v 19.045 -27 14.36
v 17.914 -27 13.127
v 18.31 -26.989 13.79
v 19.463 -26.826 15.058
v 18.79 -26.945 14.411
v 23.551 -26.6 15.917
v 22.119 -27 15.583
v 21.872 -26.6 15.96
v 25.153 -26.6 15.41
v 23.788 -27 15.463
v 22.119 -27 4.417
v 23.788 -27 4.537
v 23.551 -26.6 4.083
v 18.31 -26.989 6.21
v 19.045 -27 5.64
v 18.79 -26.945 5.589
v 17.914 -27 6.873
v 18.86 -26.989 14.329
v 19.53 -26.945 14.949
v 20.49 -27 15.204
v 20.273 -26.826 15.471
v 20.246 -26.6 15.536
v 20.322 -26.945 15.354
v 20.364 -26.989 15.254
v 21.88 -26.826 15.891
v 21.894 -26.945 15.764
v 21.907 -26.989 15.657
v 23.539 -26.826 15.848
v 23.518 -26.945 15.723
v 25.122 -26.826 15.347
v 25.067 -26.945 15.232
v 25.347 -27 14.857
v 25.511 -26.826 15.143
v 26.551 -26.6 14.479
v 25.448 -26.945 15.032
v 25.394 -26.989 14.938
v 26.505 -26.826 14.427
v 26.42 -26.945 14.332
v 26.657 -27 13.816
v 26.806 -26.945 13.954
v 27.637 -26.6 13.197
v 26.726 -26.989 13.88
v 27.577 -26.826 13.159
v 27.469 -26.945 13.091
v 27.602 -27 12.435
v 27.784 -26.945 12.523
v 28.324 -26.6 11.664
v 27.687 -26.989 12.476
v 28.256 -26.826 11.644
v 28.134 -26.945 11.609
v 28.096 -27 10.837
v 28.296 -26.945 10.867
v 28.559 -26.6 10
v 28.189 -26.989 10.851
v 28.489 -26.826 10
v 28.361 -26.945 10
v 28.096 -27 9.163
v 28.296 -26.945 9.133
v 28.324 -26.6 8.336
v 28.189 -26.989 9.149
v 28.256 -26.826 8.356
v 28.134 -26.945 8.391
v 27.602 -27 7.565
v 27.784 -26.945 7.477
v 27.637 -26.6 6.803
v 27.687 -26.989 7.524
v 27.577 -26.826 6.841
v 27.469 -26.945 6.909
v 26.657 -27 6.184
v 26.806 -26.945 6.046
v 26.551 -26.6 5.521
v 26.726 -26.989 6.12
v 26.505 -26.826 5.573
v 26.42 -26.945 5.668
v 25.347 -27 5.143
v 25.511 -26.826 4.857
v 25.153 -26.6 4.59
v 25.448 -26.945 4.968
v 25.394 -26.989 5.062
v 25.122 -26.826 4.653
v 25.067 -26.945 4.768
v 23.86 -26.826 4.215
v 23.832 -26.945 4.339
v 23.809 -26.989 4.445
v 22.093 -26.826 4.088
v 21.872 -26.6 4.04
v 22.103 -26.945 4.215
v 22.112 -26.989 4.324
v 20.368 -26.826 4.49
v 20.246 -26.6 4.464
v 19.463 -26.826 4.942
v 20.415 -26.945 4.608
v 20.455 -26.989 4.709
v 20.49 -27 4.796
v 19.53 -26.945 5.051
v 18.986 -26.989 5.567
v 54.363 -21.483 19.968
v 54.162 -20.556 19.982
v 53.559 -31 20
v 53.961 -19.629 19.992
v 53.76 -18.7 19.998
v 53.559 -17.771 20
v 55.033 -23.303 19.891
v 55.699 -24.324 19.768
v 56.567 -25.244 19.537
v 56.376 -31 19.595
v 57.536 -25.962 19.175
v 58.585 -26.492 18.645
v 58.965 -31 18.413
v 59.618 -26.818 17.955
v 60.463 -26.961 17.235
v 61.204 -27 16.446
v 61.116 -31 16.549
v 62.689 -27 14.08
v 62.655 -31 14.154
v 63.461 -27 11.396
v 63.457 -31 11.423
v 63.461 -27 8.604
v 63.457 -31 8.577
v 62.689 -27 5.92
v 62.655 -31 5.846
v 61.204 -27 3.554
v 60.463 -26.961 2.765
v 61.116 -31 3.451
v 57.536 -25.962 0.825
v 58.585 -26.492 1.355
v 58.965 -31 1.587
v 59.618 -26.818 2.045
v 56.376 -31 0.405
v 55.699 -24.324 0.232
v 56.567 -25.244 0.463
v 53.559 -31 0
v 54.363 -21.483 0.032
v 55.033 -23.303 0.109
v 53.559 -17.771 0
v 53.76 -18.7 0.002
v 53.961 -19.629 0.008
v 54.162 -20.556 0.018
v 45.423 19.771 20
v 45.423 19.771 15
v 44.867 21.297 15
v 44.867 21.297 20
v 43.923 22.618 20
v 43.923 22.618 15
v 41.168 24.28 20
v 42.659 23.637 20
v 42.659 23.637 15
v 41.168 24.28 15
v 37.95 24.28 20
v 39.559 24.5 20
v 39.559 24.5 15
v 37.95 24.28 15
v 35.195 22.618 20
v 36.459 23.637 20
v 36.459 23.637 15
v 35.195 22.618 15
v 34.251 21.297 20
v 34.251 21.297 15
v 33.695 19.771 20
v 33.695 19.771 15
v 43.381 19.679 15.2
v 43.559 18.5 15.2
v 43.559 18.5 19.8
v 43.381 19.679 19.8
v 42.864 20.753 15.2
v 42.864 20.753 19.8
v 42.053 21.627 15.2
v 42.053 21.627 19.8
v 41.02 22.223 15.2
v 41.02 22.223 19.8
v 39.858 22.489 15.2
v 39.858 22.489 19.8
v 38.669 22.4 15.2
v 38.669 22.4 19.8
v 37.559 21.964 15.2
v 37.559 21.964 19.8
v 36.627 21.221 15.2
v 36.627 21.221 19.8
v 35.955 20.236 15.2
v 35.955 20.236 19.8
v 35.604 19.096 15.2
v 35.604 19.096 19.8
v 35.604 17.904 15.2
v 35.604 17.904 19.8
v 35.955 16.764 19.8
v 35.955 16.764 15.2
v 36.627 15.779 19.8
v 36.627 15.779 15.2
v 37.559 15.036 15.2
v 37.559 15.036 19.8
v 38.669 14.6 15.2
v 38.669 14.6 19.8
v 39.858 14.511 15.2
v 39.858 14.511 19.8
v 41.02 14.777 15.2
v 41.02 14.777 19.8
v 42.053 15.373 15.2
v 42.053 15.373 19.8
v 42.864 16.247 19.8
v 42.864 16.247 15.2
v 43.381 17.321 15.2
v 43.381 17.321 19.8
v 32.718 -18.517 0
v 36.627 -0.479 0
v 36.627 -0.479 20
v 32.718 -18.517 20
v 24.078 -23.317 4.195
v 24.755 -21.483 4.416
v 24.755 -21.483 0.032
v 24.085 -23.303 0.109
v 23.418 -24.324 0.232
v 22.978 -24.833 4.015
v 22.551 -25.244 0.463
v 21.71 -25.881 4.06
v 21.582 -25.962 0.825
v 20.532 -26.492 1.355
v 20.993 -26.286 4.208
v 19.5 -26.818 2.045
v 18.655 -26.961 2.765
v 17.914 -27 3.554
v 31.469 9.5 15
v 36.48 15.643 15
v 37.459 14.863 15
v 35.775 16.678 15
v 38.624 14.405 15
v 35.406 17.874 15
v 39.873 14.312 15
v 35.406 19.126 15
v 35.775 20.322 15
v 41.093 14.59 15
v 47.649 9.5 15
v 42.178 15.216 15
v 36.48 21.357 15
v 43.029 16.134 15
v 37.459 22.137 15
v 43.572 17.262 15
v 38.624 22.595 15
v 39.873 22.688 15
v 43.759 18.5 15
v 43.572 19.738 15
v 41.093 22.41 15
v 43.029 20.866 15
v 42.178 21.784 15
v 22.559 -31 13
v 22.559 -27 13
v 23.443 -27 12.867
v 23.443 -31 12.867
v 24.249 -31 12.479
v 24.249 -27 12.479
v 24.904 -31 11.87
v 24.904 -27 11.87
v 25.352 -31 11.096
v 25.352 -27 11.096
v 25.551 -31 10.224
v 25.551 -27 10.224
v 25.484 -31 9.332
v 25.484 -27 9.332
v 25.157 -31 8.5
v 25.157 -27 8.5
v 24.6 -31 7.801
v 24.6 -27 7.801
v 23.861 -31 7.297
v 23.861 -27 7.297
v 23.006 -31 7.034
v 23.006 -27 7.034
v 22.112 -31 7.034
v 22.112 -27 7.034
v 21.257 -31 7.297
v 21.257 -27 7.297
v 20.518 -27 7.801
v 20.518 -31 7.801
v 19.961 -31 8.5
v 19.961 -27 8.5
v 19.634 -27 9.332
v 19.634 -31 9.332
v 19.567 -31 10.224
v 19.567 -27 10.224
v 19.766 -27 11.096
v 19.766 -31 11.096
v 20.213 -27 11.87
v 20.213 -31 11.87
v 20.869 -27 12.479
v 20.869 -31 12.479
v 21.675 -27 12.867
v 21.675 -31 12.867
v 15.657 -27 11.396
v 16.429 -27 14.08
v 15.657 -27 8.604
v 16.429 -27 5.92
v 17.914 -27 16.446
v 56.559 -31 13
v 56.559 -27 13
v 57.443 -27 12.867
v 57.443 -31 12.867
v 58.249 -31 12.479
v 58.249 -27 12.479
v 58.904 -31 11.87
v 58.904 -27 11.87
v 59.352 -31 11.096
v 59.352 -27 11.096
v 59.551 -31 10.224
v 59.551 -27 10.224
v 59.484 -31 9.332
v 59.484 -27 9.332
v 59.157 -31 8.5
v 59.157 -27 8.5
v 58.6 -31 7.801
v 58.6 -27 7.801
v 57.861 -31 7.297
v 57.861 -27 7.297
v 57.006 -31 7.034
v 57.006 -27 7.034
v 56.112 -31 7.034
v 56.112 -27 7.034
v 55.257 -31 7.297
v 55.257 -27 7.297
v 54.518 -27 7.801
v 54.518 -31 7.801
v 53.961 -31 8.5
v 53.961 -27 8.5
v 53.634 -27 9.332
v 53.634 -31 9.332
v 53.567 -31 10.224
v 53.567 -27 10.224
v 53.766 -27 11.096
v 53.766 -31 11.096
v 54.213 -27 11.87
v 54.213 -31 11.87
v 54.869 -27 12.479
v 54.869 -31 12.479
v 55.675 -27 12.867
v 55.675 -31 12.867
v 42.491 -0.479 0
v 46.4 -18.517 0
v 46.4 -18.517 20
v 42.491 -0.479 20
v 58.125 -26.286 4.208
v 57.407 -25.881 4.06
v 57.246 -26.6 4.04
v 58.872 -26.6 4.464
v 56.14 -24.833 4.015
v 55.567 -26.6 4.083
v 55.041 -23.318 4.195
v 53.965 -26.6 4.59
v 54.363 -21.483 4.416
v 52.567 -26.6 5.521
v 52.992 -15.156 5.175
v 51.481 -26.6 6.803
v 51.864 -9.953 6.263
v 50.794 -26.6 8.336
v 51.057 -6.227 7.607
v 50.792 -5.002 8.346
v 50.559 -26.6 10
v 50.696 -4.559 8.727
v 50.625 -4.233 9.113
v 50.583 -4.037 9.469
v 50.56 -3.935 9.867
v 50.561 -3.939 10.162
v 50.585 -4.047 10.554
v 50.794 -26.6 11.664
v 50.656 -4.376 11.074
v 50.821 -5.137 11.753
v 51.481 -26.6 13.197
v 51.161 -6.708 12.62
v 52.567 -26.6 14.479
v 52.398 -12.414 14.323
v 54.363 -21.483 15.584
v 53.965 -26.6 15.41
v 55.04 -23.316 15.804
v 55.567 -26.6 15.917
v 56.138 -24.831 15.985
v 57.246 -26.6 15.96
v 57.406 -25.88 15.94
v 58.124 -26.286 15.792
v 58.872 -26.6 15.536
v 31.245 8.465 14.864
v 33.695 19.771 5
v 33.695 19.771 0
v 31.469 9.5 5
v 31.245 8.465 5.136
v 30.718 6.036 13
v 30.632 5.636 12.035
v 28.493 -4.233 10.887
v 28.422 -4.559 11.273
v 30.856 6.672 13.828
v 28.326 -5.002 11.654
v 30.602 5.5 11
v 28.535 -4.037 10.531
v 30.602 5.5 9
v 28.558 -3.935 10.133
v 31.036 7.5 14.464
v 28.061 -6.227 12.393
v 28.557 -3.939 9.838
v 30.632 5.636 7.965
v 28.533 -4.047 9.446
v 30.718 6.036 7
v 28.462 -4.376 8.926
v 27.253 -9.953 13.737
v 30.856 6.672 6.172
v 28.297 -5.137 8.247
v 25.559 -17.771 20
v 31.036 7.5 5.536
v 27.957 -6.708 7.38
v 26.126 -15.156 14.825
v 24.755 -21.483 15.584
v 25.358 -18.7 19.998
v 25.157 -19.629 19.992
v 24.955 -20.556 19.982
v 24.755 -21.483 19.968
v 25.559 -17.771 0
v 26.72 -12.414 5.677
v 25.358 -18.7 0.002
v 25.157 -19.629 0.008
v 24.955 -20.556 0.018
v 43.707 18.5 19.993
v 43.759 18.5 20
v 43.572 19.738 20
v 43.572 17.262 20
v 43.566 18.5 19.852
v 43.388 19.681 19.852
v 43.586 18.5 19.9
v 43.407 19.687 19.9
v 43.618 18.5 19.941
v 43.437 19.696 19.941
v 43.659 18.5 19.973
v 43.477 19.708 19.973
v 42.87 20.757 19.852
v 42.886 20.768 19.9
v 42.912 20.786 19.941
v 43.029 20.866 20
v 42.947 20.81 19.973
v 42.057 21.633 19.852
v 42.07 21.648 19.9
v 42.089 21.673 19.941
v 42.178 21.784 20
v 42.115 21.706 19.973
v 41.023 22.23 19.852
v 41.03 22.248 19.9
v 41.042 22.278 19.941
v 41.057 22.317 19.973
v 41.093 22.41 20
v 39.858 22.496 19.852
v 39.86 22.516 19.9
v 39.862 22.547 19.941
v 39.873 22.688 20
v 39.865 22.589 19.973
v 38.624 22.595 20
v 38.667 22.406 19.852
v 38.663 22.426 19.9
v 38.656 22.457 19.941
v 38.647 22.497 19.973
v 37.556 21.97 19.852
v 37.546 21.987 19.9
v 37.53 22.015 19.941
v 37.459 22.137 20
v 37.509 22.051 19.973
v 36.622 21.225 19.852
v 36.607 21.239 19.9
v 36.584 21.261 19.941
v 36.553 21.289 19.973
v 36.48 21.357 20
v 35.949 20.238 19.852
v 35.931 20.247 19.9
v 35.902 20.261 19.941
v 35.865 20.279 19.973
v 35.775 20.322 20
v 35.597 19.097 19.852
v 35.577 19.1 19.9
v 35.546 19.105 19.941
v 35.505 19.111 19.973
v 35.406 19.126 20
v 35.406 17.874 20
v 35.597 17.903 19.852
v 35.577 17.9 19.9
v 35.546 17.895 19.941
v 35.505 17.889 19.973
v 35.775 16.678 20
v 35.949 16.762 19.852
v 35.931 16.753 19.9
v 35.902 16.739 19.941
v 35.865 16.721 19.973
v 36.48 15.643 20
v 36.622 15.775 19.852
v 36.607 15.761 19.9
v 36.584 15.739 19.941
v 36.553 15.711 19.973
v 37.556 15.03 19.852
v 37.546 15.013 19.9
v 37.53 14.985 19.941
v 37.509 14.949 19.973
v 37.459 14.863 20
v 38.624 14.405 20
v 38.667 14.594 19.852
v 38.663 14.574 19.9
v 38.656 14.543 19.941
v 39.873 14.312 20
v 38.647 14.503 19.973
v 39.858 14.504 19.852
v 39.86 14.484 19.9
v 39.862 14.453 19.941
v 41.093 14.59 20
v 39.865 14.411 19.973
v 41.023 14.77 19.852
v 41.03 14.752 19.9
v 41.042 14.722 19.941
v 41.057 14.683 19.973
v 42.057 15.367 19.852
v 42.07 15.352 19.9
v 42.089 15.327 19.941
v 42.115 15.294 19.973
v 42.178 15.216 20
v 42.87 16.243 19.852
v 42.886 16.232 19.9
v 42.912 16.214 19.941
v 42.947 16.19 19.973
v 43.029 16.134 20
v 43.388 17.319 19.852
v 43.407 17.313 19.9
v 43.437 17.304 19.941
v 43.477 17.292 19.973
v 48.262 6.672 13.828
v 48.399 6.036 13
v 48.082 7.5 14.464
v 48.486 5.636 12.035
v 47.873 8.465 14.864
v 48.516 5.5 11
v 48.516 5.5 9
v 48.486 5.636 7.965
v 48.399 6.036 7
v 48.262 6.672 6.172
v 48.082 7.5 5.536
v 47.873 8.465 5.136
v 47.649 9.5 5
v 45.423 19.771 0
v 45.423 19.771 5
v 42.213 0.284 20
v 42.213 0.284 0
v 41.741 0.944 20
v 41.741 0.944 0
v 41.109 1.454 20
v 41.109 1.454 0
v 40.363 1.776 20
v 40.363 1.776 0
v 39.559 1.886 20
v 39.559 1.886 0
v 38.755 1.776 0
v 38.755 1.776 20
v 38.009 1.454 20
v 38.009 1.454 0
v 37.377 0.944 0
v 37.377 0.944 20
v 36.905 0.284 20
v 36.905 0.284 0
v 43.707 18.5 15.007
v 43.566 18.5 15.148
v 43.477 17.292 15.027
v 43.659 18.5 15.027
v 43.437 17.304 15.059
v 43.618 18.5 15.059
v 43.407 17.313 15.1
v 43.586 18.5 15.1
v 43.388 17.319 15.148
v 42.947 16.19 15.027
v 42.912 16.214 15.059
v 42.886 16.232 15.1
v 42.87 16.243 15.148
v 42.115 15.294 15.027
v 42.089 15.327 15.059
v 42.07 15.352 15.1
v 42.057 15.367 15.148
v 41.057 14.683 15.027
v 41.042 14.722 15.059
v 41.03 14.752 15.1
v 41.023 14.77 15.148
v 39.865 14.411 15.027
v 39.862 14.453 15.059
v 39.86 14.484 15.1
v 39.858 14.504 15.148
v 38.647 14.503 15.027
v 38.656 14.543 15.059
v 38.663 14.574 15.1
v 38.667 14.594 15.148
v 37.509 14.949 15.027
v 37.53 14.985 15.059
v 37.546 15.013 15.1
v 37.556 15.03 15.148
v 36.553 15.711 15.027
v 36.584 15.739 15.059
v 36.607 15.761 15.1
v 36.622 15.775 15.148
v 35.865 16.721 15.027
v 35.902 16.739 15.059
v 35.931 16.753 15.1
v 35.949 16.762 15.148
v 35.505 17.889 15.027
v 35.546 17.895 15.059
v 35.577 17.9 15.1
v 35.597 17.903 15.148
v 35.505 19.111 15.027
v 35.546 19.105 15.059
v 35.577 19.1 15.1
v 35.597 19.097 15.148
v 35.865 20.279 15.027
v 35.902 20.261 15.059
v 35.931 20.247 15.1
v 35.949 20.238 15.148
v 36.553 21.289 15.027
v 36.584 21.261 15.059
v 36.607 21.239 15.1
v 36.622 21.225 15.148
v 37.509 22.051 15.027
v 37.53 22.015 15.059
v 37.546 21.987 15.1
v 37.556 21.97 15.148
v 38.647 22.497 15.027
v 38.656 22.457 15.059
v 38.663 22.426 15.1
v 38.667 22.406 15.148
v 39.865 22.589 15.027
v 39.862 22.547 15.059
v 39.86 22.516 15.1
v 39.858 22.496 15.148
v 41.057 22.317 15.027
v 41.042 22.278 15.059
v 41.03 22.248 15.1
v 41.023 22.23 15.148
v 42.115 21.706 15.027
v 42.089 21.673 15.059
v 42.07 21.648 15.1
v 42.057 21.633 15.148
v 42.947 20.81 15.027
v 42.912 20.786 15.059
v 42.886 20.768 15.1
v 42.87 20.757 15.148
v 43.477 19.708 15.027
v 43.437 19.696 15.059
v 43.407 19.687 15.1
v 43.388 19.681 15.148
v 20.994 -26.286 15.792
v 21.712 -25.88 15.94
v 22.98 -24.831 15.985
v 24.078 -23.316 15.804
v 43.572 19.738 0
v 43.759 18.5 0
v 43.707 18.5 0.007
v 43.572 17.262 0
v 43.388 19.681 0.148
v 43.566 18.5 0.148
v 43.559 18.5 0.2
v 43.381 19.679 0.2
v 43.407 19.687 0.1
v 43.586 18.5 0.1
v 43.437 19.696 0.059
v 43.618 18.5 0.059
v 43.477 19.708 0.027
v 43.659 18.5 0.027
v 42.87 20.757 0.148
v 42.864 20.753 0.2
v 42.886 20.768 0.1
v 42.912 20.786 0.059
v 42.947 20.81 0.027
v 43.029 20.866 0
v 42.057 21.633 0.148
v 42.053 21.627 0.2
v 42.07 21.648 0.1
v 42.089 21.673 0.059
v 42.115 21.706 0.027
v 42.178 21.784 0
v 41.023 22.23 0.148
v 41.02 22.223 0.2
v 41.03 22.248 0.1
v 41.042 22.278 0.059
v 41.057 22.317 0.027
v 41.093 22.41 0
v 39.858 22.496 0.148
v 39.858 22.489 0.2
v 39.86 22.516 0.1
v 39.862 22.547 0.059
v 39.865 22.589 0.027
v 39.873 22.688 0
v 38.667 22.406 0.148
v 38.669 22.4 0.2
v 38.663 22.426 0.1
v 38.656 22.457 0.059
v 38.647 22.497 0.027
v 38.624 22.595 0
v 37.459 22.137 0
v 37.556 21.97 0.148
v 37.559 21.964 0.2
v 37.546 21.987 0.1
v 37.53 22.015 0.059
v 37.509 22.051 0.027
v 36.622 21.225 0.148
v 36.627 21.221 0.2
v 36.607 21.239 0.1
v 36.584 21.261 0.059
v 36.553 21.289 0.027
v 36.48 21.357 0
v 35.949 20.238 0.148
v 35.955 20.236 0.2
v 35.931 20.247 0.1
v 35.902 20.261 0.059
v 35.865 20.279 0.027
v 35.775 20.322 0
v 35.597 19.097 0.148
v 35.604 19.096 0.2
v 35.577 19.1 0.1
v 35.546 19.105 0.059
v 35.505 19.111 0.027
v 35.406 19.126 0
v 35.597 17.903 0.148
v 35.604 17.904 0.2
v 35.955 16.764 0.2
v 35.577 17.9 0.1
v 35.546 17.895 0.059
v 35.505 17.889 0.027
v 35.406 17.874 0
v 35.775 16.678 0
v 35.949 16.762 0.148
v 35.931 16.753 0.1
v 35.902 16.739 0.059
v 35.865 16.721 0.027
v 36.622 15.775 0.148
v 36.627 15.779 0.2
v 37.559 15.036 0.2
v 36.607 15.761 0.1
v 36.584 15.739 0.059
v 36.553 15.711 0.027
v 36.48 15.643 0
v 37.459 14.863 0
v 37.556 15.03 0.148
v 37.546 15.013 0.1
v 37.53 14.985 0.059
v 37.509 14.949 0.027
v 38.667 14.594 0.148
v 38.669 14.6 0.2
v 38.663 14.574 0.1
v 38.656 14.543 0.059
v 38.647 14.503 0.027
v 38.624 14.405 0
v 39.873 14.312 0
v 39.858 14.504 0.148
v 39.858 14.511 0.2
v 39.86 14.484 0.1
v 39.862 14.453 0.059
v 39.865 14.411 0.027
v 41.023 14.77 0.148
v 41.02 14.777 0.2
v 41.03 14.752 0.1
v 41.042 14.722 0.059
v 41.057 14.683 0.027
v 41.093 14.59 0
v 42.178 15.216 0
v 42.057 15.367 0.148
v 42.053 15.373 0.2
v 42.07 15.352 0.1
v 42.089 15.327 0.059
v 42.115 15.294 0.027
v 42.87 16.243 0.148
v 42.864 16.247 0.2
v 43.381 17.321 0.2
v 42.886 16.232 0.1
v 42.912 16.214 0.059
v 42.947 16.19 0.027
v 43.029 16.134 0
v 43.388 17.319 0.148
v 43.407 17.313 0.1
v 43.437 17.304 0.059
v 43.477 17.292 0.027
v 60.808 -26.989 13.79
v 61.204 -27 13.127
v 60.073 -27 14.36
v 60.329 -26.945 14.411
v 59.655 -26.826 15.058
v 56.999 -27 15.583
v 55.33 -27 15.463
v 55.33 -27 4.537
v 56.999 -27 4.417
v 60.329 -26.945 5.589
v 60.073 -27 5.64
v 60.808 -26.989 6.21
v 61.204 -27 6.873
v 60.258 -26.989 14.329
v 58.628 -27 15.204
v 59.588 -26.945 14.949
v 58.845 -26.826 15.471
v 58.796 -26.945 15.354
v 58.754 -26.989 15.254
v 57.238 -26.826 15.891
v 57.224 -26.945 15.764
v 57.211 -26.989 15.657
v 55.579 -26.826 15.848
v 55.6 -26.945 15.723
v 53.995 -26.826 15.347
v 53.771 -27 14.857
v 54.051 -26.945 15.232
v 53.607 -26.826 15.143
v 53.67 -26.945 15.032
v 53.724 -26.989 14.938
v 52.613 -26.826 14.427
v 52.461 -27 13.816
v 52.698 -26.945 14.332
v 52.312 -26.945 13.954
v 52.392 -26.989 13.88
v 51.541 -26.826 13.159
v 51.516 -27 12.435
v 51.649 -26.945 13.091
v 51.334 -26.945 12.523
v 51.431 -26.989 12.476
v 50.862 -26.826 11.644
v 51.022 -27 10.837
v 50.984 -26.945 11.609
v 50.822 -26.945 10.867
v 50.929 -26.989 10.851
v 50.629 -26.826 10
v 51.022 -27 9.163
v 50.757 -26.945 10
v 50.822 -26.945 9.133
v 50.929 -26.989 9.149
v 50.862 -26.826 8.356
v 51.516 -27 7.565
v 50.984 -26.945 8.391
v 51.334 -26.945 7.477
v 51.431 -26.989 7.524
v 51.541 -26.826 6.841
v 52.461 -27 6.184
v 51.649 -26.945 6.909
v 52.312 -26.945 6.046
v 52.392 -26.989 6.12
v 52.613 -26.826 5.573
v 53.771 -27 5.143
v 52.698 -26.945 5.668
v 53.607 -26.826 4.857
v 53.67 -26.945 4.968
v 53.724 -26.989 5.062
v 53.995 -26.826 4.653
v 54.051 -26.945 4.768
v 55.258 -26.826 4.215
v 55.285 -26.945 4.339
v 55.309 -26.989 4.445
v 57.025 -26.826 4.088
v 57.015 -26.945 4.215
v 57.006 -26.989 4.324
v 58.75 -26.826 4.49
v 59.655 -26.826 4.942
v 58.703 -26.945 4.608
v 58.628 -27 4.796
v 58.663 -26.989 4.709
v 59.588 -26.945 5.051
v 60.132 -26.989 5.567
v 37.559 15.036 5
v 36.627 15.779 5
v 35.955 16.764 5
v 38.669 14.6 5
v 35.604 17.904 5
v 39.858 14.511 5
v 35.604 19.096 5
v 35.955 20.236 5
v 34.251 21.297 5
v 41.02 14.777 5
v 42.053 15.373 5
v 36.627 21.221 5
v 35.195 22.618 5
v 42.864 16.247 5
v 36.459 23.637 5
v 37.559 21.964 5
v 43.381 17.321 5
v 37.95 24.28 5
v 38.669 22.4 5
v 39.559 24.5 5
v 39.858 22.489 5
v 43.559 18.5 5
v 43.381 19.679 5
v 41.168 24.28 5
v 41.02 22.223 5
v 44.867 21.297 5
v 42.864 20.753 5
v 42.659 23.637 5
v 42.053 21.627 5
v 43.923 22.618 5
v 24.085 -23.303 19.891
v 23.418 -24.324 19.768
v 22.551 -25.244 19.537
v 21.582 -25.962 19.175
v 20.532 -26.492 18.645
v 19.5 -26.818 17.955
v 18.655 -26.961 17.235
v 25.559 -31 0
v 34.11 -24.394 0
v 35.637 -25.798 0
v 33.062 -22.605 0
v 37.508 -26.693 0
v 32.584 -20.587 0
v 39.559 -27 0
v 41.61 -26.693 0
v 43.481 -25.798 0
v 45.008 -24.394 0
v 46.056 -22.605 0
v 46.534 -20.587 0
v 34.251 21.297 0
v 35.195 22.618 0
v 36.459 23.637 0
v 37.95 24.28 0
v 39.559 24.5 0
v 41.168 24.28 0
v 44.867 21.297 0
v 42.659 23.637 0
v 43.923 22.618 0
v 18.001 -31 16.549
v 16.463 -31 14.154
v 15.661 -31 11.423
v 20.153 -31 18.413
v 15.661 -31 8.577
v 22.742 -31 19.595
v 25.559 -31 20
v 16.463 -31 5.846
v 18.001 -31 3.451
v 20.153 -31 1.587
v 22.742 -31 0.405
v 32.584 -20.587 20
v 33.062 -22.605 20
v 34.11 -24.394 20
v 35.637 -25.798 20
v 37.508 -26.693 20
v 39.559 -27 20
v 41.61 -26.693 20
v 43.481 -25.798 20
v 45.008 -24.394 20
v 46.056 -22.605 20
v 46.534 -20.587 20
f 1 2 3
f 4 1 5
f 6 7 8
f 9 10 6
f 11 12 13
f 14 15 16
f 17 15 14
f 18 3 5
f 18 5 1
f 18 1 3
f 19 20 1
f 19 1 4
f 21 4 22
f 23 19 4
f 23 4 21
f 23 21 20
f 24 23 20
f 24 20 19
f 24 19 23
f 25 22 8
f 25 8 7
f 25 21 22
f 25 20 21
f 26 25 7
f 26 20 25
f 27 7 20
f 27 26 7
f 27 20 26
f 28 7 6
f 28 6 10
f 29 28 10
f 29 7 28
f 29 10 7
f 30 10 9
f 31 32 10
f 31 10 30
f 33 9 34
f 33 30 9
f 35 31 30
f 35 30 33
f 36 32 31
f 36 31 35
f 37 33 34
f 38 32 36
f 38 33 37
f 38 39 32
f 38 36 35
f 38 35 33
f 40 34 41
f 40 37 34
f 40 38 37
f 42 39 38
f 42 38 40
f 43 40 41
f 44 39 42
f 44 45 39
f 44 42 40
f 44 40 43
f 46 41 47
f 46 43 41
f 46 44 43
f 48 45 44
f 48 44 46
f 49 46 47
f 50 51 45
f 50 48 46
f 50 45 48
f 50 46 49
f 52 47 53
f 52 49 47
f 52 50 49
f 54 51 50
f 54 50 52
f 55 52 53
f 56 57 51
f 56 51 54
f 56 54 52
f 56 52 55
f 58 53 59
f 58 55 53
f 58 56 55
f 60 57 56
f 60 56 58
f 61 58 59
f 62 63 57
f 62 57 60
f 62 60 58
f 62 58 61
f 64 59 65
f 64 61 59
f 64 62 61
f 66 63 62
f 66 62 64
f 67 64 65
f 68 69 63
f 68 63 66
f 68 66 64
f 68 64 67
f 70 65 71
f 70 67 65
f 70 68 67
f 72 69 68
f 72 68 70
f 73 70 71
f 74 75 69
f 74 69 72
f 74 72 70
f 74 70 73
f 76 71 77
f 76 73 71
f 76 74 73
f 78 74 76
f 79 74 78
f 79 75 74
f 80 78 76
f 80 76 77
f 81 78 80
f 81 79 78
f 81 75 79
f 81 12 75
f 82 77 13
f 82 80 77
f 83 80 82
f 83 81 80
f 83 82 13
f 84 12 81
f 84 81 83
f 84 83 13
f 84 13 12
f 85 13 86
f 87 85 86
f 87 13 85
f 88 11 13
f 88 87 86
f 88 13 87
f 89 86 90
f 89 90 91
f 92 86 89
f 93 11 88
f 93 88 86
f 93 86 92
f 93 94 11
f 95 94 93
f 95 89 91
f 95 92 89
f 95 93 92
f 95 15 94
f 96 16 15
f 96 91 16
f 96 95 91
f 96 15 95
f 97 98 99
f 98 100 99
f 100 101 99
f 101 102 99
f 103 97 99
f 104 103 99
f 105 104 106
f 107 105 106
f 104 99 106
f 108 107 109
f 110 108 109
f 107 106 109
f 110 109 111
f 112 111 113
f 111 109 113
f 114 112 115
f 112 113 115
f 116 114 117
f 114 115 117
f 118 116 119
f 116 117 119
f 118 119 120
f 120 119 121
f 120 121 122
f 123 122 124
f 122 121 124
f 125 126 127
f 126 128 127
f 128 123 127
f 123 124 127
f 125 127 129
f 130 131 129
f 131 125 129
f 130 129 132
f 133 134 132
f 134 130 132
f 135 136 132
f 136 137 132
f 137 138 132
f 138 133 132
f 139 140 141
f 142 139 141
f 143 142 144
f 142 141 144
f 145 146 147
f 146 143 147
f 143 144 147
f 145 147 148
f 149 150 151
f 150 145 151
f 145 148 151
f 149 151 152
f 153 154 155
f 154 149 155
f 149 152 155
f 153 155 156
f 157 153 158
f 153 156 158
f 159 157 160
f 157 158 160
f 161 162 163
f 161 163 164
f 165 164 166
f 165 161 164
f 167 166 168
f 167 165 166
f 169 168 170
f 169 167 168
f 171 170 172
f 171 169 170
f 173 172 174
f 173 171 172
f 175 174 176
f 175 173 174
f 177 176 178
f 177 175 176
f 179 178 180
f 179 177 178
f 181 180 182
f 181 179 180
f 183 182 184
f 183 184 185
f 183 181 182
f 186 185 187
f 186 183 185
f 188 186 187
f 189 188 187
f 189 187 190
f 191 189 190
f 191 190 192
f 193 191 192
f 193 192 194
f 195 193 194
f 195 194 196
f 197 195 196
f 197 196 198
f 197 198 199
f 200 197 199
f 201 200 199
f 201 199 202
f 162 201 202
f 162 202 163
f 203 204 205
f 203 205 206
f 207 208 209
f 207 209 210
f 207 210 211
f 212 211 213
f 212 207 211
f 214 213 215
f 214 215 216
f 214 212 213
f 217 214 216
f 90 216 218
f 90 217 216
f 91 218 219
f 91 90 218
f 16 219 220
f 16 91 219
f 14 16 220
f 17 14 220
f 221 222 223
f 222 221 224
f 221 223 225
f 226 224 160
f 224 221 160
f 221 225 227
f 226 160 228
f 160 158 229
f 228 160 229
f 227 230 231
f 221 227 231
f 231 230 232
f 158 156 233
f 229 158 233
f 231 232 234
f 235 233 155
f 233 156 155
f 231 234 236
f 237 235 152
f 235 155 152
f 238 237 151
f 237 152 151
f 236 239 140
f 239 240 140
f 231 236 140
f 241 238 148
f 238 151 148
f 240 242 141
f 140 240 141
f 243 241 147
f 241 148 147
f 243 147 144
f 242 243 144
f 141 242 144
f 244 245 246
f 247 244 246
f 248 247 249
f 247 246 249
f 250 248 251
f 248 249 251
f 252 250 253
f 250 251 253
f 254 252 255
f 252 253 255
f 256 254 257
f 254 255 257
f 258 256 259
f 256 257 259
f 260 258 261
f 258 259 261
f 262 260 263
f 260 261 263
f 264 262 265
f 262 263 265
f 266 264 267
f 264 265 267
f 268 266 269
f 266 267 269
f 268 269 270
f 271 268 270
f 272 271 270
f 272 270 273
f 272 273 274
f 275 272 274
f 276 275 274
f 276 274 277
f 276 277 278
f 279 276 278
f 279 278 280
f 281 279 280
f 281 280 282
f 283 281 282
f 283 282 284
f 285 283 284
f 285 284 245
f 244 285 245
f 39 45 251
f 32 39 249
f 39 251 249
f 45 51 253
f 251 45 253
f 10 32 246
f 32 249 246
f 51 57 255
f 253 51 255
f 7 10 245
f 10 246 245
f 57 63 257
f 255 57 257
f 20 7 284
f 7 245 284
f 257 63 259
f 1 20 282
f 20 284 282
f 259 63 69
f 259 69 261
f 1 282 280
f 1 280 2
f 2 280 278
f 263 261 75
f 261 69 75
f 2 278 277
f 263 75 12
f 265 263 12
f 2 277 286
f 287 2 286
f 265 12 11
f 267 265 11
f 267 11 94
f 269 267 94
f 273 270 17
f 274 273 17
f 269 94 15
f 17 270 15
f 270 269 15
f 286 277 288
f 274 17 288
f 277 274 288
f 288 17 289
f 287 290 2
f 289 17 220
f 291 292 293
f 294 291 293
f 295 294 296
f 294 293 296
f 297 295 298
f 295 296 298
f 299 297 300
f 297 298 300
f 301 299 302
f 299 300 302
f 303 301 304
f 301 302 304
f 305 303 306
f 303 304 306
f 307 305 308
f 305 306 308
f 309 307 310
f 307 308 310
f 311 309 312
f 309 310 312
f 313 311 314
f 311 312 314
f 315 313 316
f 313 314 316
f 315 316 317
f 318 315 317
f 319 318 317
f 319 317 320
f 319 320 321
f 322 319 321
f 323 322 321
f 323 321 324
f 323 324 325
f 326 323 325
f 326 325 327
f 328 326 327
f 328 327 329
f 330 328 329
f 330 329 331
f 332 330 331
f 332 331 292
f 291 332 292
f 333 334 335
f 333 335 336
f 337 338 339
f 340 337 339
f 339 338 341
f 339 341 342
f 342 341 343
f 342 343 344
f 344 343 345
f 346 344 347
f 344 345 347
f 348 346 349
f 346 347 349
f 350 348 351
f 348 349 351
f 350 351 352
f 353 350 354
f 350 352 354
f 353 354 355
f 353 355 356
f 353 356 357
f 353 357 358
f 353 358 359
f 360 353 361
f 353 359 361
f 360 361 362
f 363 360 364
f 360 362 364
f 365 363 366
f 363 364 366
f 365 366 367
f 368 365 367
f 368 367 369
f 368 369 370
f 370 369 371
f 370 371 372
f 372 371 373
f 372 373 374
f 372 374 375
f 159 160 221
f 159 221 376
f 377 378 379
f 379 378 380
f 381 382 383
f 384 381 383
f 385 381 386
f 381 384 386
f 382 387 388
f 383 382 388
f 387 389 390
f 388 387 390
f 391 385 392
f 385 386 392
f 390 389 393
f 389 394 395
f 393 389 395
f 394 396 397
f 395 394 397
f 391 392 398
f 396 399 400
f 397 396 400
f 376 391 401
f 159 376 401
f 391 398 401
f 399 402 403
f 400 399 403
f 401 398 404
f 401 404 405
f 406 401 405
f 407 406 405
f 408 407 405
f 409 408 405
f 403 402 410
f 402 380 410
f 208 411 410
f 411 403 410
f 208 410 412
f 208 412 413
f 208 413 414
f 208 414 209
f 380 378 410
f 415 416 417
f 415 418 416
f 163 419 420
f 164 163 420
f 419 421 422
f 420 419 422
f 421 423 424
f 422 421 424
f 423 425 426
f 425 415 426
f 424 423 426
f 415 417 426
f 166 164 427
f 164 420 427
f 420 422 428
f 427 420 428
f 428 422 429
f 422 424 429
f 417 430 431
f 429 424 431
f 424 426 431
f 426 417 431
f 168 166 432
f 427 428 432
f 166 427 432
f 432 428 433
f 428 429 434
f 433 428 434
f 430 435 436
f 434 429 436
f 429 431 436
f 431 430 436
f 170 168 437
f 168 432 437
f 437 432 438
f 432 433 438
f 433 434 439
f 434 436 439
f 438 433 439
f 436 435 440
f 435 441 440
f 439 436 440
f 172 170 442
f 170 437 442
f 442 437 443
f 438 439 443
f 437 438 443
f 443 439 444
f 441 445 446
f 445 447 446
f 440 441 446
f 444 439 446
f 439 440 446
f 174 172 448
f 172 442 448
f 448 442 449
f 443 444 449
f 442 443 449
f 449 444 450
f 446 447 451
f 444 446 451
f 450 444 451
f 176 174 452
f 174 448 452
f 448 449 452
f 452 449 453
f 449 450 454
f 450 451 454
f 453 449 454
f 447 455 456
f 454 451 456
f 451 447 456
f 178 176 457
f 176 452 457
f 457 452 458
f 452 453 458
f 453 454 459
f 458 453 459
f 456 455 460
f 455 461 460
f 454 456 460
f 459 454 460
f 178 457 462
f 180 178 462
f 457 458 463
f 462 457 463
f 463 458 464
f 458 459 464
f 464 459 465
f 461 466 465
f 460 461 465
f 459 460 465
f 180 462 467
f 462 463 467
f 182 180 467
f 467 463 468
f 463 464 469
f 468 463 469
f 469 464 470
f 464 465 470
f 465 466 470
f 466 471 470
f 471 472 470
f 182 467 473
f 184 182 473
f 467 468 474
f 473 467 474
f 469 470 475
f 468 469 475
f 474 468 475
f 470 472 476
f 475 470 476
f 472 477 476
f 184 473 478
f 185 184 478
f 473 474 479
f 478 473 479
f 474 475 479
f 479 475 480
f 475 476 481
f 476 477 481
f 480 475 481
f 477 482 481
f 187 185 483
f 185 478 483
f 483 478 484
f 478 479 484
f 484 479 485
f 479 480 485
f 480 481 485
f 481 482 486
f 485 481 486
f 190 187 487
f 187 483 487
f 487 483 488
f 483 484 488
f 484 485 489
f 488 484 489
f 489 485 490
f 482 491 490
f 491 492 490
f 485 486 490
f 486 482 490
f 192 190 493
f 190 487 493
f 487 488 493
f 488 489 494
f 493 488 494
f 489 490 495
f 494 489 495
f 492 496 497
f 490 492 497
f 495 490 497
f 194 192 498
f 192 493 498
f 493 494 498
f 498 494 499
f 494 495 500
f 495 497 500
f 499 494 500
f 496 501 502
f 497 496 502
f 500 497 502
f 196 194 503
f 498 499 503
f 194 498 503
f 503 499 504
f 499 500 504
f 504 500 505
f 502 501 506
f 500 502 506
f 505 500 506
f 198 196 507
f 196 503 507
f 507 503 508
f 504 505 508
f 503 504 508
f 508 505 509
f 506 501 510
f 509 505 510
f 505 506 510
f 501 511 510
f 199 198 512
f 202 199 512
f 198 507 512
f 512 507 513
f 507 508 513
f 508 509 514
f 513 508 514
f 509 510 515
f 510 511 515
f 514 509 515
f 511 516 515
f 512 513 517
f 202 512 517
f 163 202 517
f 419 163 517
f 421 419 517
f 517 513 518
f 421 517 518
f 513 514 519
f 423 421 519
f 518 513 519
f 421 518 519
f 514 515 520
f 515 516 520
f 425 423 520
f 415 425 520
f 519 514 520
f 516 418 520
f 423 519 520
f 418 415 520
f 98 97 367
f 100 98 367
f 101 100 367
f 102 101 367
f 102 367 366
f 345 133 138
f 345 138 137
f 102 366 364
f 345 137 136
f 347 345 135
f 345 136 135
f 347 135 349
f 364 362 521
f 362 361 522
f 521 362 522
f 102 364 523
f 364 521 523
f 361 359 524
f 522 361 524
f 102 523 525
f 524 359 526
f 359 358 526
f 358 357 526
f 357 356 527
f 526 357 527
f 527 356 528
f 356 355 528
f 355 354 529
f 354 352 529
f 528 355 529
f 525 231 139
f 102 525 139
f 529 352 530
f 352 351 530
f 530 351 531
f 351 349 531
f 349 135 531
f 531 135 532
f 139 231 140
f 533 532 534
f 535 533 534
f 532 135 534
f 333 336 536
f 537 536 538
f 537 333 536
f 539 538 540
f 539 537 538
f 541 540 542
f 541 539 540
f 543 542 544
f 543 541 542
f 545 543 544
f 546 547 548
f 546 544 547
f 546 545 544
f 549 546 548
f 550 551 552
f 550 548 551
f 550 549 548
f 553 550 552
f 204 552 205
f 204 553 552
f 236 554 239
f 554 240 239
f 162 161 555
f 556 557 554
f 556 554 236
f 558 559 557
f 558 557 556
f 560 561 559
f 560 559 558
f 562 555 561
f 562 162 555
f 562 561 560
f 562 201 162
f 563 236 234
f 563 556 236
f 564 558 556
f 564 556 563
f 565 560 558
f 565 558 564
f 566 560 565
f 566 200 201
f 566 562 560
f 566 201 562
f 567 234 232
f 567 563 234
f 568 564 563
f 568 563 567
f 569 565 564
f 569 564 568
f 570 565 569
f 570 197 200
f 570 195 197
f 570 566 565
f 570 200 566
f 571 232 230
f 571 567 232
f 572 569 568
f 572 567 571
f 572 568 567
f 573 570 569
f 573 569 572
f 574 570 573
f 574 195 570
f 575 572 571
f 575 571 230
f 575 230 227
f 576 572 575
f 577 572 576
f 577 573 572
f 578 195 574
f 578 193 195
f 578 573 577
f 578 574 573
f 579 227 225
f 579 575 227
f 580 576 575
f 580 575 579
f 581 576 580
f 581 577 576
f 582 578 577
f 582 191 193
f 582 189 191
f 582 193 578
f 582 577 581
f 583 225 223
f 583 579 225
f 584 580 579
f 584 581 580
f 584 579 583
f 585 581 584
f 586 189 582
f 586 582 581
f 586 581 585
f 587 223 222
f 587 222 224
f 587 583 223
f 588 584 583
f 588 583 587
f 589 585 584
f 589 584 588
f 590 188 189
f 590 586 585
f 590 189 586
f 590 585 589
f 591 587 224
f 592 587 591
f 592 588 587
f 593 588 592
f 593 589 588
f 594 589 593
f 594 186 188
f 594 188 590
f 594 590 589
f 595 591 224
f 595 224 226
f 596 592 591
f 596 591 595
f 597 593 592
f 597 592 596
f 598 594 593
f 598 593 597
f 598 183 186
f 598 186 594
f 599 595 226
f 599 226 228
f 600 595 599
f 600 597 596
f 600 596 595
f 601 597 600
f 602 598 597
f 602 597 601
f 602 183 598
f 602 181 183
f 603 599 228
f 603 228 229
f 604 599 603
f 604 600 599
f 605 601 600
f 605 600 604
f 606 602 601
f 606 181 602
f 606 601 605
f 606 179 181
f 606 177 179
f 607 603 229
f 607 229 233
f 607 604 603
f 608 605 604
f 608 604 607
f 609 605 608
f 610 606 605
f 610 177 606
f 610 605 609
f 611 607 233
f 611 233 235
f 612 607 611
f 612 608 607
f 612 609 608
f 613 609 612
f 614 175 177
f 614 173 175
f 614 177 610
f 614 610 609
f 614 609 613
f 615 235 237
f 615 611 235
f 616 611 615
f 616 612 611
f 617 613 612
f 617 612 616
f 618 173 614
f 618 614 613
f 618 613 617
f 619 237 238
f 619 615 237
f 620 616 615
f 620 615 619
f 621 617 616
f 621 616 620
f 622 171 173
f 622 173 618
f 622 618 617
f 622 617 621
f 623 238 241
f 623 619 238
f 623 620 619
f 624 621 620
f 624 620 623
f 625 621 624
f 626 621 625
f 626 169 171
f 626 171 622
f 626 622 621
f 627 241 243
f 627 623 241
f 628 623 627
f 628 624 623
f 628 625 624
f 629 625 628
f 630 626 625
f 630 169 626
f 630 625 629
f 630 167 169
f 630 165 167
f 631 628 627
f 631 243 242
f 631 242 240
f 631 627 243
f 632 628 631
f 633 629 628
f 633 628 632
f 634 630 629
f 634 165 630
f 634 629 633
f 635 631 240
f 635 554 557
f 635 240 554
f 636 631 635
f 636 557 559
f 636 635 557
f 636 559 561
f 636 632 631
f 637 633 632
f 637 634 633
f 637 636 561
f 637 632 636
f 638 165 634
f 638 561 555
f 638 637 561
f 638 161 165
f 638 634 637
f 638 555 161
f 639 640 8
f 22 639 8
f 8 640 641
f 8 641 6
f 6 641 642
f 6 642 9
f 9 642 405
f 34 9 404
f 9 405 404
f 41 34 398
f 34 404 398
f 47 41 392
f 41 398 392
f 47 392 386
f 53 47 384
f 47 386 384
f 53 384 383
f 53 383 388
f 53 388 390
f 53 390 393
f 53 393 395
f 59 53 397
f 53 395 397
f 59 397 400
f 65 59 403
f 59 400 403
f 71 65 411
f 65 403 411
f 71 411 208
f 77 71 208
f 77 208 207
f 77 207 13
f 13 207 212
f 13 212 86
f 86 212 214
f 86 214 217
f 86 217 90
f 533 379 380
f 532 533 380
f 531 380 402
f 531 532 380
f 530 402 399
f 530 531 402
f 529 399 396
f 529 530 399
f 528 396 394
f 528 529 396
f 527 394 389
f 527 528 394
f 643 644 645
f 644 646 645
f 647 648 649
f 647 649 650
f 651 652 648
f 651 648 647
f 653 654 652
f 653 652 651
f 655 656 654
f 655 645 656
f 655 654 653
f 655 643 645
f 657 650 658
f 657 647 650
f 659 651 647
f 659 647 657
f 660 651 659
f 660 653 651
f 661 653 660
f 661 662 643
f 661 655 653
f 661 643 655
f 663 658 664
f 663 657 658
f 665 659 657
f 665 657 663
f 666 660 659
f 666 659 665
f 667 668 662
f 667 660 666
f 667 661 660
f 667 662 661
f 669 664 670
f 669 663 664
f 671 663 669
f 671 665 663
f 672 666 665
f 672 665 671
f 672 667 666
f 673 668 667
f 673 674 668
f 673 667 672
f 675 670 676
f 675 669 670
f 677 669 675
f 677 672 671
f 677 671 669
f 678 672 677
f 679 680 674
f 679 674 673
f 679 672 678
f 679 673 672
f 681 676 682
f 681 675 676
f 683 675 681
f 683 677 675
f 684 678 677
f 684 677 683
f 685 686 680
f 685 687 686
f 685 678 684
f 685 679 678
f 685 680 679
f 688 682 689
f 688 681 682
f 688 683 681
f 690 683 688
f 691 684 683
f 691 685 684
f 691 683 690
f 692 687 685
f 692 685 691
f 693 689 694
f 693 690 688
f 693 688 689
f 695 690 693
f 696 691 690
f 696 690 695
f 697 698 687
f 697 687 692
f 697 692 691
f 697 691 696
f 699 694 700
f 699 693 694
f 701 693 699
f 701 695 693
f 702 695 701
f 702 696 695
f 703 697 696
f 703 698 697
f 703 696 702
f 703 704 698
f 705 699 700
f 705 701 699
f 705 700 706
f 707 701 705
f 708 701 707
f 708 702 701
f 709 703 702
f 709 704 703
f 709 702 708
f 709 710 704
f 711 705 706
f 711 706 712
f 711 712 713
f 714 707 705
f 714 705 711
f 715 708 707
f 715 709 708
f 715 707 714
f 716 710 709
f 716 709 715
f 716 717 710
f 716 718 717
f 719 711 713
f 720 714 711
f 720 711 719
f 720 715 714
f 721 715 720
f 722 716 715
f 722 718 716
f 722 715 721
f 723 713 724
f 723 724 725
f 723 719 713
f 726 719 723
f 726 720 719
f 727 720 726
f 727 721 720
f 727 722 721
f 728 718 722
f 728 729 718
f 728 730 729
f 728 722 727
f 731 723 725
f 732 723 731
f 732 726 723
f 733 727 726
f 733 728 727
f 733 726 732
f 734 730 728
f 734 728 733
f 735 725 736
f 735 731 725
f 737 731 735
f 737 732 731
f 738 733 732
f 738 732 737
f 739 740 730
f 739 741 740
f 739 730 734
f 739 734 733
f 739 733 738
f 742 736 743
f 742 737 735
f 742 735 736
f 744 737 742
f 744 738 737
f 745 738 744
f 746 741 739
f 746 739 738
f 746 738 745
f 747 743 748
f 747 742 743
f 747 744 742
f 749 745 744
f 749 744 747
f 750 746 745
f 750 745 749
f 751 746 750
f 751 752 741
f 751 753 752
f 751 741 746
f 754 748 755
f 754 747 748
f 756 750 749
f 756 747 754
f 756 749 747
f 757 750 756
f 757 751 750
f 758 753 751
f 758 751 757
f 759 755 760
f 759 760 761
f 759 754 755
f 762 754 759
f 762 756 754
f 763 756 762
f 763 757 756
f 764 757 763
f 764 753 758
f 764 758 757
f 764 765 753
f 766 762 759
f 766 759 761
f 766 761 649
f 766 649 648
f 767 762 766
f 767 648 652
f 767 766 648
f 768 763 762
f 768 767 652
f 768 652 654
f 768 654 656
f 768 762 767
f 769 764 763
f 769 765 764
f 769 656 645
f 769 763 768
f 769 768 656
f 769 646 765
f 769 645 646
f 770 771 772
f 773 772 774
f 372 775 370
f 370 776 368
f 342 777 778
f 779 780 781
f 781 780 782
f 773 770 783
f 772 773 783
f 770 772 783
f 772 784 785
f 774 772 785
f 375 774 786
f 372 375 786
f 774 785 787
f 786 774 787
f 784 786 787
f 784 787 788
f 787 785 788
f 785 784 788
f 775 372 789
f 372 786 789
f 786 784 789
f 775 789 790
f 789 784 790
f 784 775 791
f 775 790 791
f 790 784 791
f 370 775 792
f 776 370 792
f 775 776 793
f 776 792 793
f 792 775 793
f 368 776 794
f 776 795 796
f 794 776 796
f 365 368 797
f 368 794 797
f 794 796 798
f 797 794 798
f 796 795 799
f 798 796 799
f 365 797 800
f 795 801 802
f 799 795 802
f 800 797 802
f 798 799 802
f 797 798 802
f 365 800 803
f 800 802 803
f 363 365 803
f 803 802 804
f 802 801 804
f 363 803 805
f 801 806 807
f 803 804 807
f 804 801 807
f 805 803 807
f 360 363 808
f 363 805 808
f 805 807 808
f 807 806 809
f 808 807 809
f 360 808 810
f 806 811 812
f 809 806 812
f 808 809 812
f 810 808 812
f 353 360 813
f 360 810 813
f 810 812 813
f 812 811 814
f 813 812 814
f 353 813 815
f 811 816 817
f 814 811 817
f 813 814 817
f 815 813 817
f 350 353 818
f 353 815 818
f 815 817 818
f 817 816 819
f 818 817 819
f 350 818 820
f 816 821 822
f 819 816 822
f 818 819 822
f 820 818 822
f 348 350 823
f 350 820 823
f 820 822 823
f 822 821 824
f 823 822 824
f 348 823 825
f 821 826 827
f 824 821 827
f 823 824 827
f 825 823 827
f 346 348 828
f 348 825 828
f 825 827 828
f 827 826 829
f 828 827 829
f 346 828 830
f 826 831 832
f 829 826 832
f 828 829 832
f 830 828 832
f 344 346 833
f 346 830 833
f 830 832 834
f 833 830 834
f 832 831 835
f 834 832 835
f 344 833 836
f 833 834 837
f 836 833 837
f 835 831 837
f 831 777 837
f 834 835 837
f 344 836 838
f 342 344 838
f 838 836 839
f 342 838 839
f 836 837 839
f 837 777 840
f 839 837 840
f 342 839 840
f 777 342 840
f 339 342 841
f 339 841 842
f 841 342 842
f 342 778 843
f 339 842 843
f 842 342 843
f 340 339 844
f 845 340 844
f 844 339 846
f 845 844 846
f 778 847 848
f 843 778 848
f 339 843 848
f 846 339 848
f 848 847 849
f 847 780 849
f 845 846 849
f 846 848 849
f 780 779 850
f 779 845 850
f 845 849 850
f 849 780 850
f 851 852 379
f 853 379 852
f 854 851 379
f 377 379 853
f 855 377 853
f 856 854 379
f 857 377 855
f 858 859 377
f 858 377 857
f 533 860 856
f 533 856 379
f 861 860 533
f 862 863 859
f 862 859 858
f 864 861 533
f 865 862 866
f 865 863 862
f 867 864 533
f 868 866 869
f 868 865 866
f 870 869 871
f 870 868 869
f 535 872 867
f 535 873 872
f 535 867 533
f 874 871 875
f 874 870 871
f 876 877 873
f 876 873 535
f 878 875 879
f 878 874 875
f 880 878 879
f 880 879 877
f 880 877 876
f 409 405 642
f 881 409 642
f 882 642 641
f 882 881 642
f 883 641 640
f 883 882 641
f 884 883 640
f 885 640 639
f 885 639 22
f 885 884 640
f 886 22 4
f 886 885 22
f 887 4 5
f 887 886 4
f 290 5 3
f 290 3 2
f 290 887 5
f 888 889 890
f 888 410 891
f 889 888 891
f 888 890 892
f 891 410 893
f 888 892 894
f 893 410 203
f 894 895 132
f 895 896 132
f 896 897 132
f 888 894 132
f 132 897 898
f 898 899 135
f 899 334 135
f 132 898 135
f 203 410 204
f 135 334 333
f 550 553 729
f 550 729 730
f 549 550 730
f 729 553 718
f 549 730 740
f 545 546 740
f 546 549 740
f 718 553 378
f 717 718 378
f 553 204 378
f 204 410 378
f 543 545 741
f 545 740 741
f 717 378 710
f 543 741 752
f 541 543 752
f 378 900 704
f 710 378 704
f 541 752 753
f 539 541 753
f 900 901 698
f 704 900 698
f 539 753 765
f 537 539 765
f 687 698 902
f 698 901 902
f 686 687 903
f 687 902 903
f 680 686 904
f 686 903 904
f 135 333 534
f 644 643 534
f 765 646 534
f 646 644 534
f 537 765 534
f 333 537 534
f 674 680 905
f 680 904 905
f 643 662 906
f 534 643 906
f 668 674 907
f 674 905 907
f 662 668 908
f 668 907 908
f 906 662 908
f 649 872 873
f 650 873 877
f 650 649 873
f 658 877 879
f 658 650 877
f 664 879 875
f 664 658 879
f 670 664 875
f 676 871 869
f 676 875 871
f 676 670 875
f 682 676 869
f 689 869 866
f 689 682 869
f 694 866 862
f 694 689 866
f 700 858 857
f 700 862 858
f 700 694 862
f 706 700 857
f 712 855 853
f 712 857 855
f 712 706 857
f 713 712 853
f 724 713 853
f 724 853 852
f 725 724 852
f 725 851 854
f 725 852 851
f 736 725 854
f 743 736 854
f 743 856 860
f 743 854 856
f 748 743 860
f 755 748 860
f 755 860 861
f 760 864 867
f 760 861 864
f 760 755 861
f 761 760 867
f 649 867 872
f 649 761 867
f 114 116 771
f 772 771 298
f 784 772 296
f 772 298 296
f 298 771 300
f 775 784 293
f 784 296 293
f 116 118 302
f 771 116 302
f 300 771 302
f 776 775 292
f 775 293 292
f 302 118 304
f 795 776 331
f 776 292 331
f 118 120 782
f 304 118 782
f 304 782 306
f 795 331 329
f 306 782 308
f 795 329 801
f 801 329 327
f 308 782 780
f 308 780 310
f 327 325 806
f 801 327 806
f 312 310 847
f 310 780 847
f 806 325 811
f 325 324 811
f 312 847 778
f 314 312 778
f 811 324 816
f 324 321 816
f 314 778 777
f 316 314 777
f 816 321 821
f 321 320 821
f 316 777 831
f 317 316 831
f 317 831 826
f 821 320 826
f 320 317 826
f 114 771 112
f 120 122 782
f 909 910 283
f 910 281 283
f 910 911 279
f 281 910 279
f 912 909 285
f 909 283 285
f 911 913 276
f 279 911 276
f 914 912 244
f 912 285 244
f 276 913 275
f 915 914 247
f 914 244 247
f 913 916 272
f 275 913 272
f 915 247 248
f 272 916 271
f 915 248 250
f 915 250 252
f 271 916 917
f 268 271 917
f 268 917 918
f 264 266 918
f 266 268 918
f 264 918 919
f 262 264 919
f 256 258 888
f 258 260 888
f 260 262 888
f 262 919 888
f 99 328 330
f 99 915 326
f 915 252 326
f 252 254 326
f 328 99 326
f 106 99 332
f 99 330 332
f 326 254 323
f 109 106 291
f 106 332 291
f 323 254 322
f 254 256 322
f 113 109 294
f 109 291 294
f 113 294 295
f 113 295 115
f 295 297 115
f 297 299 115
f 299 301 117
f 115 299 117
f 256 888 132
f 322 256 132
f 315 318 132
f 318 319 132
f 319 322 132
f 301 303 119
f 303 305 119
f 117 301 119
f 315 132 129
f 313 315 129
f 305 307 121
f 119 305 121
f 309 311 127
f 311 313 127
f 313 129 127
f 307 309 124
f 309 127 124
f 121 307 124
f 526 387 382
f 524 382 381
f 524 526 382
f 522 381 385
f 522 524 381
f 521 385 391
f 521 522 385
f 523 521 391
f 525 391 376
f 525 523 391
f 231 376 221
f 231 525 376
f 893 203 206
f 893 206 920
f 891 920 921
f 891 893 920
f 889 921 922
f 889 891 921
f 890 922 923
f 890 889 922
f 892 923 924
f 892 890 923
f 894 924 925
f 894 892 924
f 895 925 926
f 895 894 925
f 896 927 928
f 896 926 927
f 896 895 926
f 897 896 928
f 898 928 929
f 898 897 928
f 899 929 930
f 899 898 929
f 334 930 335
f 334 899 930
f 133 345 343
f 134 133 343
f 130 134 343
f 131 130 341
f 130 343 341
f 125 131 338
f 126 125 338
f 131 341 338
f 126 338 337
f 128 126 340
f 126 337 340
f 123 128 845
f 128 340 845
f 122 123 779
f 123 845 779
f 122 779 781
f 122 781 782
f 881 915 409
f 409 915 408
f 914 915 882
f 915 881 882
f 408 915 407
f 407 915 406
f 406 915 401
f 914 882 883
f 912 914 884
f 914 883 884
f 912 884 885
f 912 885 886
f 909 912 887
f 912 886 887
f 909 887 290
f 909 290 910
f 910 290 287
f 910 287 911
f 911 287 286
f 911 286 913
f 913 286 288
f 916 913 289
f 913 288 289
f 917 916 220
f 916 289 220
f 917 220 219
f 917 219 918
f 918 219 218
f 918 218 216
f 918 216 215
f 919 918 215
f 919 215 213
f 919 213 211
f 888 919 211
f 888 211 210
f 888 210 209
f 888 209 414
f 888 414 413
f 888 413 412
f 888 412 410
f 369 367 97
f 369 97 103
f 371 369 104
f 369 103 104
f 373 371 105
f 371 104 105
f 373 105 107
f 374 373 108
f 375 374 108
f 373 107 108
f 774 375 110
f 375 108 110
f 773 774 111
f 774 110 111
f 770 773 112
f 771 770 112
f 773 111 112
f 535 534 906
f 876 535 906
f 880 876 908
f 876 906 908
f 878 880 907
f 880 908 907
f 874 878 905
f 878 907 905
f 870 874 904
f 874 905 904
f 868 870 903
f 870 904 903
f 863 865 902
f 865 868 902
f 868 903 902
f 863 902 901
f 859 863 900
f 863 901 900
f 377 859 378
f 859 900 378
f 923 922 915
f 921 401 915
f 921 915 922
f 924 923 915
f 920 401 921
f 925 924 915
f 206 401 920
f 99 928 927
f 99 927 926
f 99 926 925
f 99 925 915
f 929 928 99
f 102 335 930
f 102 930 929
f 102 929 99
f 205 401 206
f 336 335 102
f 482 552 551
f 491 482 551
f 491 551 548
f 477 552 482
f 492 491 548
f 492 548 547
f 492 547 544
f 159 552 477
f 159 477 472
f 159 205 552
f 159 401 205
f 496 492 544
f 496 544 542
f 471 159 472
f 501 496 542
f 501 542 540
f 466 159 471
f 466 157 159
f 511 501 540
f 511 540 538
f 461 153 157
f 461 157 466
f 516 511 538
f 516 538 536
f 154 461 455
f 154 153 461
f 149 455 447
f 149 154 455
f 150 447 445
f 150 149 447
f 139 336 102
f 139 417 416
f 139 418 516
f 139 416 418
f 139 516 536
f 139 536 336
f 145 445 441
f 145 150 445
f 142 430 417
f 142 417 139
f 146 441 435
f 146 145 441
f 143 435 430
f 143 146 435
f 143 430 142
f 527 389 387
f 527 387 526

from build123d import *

# Parameters (mm, degrees)
SZKIC1_R                    = 4
DODANIE_WYCI_GNI_CIE1_DEPTH = 20
SZKIC2_W                    = 28.4
SZKIC2_H                    = 10
WYTNIJ_WYCI_GNI_CIE1_DEPTH  = 22
SZKIC3_R                    = 3
WYTNIJ_WYCI_GNI_CIE2_DEPTH  = 89.667893976
SZKIC4_R                    = 6
WYTNIJ_WYCI_GNI_CIE3_DEPTH  = 54.5
WYTNIJ_WYCI_GNI_CIE5_DEPTH  = 74.489764063
ZAOKR_GLENIE1_R             = 10
WYTNIJ_WYCI_GNI_CIE6_DEPTH  = 74.489764063
ZAOKR_GLENIE2_R             = 7
ZAOKR_GLENIE3_R             = 4
ZAOKR_GLENIE4_R             = 0.4
ZAOKR_GLENIE5_R             = 0.2


with BuildPart() as part:
    # Szkic1 → Dodanie-wyciągnięcie1 (new body)
    with BuildSketch(Plane.XY):
        Polygon((15.55899167, -31), (63.55899167, -31), (63.55899167, -27), (48.75899167, 4.5), (48.75899167, 27.5), (30.35899167, 27.5), (30.35899167, 4.5), (15.55899167, -27), align=None)
        with Locations((39.55899167, 18.5)):
            Circle(SZKIC1_R, mode=Mode.SUBTRACT)
    extrude(amount=DODANIE_WYCI_GNI_CIE1_DEPTH)

    # Szkic2 → Wytnij-wyciągnięcie1 (cut)
    with BuildSketch(Plane(origin=(0, 27.5, 0), x_dir=(1, 0, 0), z_dir=(0, 1, 0))):
        with Locations((39.55899167, -10)):
            Rectangle(SZKIC2_W, SZKIC2_H)
    extrude(amount=-WYTNIJ_WYCI_GNI_CIE1_DEPTH, mode=Mode.SUBTRACT)

    # Szkic3 → Wytnij-wyciągnięcie2 (cut, through all)
    with BuildSketch(Plane(origin=(0, 27.5, 0), x_dir=(1, 0, 0), z_dir=(0, 1, 0))):
        with Locations(Location((56.55899167, -10, 0), (0, 0, 270))):
            Circle(SZKIC3_R)
        with Locations(Location((22.55899167, -10, 0), (0, 0, 270))):
            Circle(SZKIC3_R)
    extrude(amount=-WYTNIJ_WYCI_GNI_CIE2_DEPTH, mode=Mode.SUBTRACT)

    # Szkic4 → Wytnij-wyciągnięcie3 (cut)
    with BuildSketch(Plane(origin=(0, 27.5, 0), x_dir=(1, 0, 0), z_dir=(0, 1, 0))):
        with Locations(Location((56.55899167, -10, 0), (0, 0, 270))):
            Circle(SZKIC4_R)
        with Locations(Location((22.55899167, -10, 0), (0, 0, 270))):
            Circle(SZKIC4_R)
    extrude(amount=-WYTNIJ_WYCI_GNI_CIE3_DEPTH, mode=Mode.SUBTRACT)

    # Szkic6 → Wytnij-wyciągnięcie5 (cut, through all)
    with BuildSketch(Plane(origin=(0, 0, 0), x_dir=(-1, 0, 0), z_dir=(0, 0, -1))):
        with BuildLine():
            Line((-63.55899167, -27), (-55.55899167, -27))
            Line((-55.55899167, -27), (-45.422866973, 19.770813293))
            ThreePointArc((-45.422866973, 19.770813293), (-39.55899167, 24.5), (-33.695116367, 19.770813293))
            Line((-33.695116367, 19.770813293), (-23.55899167, -27))
            Line((-23.55899167, -27), (-15.55899167, -27))
            Line((-15.55899167, -27), (-15.55899167, 33))
            Line((-15.55899167, 33), (-63.55899167, 33))
            Line((-63.55899167, 33), (-63.55899167, -27))
        make_face()
    extrude(amount=-WYTNIJ_WYCI_GNI_CIE5_DEPTH, mode=Mode.SUBTRACT)

    # Zaokrąglenie1
    # the kernel refuses this fillet: 10 mm, written as the material it takes off along each edge
    with BuildSketch(Plane(origin=(63.55899167, -56, 20), x_dir=(0, 0, -1), z_dir=(0, 1, 0)), Plane(origin=(15.55899167, -2, 0), x_dir=(1, 0, 0), z_dir=(0, -1, 0))) as zaokr_glenie1_piece_1:
        with BuildLine():
            CenterArc((ZAOKR_GLENIE1_R, ZAOKR_GLENIE1_R), ZAOKR_GLENIE1_R, 180, 90)
            Line((0, ZAOKR_GLENIE1_R), (0, 0))
            Line((0, 0), (ZAOKR_GLENIE1_R, 0))
        make_face()
    extrude(amount=54, mode=Mode.SUBTRACT)
    with BuildSketch(Plane(origin=(63.55899167, -56, 0), x_dir=(0, 0, 1), z_dir=(0, 1, 0)), Plane(origin=(15.55899167, -2, 20), x_dir=(1, 0, 0), z_dir=(0, -1, 0))) as zaokr_glenie1_piece_2:
        with BuildLine():
            CenterArc((ZAOKR_GLENIE1_R, -ZAOKR_GLENIE1_R), ZAOKR_GLENIE1_R, 90, 90)
            Line((0, -ZAOKR_GLENIE1_R), (0, 0))
            Line((0, 0), (ZAOKR_GLENIE1_R, 0))
        make_face()
    extrude(amount=54, mode=Mode.SUBTRACT)

    # Szkic7 → Wytnij-wyciągnięcie6 (cut, through all)
    with BuildSketch(Plane(origin=(0, 0, 0), x_dir=(-1, 0, 0), z_dir=(0, 0, -1))):
        with BuildLine():
            Line((-46.400179524, -18.517384491), (-42.490929322, -0.479049644))
            ThreePointArc((-42.490929322, -0.479049644), (-39.55899167, 1.885543709), (-36.627054018, -0.479049644))
            Line((-36.627054018, -0.479049644), (-32.717803816, -18.517384491))
            ThreePointArc((-32.717803816, -18.517384491), (-39.55899167, -27), (-46.400179524, -18.517384491))
        make_face()
    extrude(amount=-WYTNIJ_WYCI_GNI_CIE6_DEPTH, mode=Mode.SUBTRACT)

    # Zaokrąglenie2
    zaokr_glenie2_edges = [part.edges().sort_by_distance(p)[0] for p in [
        (55.55899167, -27, 17.857019377),
        (55.55899167, -27, 2.142980623),
        (23.55899167, -27, 17.857019377),
        (23.55899167, -27, 2.142980623),
    ]]
    fillet(zaokr_glenie2_edges, radius=ZAOKR_GLENIE2_R)

    # Zaokrąglenie3
    zaokr_glenie3_edges = [part.edges().sort_by_distance(p)[0] for p in [
        (39.55899167, 5.5, 5),
        (39.55899167, 5.5, 15),
    ]]
    fillet(zaokr_glenie3_edges, radius=ZAOKR_GLENIE3_R)

    # Zaokrąglenie4
    zaokr_glenie4_edges = [part.edges().sort_by_distance(p)[0] for p in [
        (50.55899167, -27, 10),
        (28.55899167, -27, 10),
    ]]
    fillet(zaokr_glenie4_edges, radius=ZAOKR_GLENIE4_R)

    # Zaokrąglenie5
    zaokr_glenie5_edges = [part.edges().sort_by_distance(p)[0] for p in [
        (35.55899167, 18.5, 0),
        (35.55899167, 18.5, 20),
        (35.55899167, 18.5, 15),
    ]]
    fillet(zaokr_glenie5_edges, radius=ZAOKR_GLENIE5_R)


solid = part.part
